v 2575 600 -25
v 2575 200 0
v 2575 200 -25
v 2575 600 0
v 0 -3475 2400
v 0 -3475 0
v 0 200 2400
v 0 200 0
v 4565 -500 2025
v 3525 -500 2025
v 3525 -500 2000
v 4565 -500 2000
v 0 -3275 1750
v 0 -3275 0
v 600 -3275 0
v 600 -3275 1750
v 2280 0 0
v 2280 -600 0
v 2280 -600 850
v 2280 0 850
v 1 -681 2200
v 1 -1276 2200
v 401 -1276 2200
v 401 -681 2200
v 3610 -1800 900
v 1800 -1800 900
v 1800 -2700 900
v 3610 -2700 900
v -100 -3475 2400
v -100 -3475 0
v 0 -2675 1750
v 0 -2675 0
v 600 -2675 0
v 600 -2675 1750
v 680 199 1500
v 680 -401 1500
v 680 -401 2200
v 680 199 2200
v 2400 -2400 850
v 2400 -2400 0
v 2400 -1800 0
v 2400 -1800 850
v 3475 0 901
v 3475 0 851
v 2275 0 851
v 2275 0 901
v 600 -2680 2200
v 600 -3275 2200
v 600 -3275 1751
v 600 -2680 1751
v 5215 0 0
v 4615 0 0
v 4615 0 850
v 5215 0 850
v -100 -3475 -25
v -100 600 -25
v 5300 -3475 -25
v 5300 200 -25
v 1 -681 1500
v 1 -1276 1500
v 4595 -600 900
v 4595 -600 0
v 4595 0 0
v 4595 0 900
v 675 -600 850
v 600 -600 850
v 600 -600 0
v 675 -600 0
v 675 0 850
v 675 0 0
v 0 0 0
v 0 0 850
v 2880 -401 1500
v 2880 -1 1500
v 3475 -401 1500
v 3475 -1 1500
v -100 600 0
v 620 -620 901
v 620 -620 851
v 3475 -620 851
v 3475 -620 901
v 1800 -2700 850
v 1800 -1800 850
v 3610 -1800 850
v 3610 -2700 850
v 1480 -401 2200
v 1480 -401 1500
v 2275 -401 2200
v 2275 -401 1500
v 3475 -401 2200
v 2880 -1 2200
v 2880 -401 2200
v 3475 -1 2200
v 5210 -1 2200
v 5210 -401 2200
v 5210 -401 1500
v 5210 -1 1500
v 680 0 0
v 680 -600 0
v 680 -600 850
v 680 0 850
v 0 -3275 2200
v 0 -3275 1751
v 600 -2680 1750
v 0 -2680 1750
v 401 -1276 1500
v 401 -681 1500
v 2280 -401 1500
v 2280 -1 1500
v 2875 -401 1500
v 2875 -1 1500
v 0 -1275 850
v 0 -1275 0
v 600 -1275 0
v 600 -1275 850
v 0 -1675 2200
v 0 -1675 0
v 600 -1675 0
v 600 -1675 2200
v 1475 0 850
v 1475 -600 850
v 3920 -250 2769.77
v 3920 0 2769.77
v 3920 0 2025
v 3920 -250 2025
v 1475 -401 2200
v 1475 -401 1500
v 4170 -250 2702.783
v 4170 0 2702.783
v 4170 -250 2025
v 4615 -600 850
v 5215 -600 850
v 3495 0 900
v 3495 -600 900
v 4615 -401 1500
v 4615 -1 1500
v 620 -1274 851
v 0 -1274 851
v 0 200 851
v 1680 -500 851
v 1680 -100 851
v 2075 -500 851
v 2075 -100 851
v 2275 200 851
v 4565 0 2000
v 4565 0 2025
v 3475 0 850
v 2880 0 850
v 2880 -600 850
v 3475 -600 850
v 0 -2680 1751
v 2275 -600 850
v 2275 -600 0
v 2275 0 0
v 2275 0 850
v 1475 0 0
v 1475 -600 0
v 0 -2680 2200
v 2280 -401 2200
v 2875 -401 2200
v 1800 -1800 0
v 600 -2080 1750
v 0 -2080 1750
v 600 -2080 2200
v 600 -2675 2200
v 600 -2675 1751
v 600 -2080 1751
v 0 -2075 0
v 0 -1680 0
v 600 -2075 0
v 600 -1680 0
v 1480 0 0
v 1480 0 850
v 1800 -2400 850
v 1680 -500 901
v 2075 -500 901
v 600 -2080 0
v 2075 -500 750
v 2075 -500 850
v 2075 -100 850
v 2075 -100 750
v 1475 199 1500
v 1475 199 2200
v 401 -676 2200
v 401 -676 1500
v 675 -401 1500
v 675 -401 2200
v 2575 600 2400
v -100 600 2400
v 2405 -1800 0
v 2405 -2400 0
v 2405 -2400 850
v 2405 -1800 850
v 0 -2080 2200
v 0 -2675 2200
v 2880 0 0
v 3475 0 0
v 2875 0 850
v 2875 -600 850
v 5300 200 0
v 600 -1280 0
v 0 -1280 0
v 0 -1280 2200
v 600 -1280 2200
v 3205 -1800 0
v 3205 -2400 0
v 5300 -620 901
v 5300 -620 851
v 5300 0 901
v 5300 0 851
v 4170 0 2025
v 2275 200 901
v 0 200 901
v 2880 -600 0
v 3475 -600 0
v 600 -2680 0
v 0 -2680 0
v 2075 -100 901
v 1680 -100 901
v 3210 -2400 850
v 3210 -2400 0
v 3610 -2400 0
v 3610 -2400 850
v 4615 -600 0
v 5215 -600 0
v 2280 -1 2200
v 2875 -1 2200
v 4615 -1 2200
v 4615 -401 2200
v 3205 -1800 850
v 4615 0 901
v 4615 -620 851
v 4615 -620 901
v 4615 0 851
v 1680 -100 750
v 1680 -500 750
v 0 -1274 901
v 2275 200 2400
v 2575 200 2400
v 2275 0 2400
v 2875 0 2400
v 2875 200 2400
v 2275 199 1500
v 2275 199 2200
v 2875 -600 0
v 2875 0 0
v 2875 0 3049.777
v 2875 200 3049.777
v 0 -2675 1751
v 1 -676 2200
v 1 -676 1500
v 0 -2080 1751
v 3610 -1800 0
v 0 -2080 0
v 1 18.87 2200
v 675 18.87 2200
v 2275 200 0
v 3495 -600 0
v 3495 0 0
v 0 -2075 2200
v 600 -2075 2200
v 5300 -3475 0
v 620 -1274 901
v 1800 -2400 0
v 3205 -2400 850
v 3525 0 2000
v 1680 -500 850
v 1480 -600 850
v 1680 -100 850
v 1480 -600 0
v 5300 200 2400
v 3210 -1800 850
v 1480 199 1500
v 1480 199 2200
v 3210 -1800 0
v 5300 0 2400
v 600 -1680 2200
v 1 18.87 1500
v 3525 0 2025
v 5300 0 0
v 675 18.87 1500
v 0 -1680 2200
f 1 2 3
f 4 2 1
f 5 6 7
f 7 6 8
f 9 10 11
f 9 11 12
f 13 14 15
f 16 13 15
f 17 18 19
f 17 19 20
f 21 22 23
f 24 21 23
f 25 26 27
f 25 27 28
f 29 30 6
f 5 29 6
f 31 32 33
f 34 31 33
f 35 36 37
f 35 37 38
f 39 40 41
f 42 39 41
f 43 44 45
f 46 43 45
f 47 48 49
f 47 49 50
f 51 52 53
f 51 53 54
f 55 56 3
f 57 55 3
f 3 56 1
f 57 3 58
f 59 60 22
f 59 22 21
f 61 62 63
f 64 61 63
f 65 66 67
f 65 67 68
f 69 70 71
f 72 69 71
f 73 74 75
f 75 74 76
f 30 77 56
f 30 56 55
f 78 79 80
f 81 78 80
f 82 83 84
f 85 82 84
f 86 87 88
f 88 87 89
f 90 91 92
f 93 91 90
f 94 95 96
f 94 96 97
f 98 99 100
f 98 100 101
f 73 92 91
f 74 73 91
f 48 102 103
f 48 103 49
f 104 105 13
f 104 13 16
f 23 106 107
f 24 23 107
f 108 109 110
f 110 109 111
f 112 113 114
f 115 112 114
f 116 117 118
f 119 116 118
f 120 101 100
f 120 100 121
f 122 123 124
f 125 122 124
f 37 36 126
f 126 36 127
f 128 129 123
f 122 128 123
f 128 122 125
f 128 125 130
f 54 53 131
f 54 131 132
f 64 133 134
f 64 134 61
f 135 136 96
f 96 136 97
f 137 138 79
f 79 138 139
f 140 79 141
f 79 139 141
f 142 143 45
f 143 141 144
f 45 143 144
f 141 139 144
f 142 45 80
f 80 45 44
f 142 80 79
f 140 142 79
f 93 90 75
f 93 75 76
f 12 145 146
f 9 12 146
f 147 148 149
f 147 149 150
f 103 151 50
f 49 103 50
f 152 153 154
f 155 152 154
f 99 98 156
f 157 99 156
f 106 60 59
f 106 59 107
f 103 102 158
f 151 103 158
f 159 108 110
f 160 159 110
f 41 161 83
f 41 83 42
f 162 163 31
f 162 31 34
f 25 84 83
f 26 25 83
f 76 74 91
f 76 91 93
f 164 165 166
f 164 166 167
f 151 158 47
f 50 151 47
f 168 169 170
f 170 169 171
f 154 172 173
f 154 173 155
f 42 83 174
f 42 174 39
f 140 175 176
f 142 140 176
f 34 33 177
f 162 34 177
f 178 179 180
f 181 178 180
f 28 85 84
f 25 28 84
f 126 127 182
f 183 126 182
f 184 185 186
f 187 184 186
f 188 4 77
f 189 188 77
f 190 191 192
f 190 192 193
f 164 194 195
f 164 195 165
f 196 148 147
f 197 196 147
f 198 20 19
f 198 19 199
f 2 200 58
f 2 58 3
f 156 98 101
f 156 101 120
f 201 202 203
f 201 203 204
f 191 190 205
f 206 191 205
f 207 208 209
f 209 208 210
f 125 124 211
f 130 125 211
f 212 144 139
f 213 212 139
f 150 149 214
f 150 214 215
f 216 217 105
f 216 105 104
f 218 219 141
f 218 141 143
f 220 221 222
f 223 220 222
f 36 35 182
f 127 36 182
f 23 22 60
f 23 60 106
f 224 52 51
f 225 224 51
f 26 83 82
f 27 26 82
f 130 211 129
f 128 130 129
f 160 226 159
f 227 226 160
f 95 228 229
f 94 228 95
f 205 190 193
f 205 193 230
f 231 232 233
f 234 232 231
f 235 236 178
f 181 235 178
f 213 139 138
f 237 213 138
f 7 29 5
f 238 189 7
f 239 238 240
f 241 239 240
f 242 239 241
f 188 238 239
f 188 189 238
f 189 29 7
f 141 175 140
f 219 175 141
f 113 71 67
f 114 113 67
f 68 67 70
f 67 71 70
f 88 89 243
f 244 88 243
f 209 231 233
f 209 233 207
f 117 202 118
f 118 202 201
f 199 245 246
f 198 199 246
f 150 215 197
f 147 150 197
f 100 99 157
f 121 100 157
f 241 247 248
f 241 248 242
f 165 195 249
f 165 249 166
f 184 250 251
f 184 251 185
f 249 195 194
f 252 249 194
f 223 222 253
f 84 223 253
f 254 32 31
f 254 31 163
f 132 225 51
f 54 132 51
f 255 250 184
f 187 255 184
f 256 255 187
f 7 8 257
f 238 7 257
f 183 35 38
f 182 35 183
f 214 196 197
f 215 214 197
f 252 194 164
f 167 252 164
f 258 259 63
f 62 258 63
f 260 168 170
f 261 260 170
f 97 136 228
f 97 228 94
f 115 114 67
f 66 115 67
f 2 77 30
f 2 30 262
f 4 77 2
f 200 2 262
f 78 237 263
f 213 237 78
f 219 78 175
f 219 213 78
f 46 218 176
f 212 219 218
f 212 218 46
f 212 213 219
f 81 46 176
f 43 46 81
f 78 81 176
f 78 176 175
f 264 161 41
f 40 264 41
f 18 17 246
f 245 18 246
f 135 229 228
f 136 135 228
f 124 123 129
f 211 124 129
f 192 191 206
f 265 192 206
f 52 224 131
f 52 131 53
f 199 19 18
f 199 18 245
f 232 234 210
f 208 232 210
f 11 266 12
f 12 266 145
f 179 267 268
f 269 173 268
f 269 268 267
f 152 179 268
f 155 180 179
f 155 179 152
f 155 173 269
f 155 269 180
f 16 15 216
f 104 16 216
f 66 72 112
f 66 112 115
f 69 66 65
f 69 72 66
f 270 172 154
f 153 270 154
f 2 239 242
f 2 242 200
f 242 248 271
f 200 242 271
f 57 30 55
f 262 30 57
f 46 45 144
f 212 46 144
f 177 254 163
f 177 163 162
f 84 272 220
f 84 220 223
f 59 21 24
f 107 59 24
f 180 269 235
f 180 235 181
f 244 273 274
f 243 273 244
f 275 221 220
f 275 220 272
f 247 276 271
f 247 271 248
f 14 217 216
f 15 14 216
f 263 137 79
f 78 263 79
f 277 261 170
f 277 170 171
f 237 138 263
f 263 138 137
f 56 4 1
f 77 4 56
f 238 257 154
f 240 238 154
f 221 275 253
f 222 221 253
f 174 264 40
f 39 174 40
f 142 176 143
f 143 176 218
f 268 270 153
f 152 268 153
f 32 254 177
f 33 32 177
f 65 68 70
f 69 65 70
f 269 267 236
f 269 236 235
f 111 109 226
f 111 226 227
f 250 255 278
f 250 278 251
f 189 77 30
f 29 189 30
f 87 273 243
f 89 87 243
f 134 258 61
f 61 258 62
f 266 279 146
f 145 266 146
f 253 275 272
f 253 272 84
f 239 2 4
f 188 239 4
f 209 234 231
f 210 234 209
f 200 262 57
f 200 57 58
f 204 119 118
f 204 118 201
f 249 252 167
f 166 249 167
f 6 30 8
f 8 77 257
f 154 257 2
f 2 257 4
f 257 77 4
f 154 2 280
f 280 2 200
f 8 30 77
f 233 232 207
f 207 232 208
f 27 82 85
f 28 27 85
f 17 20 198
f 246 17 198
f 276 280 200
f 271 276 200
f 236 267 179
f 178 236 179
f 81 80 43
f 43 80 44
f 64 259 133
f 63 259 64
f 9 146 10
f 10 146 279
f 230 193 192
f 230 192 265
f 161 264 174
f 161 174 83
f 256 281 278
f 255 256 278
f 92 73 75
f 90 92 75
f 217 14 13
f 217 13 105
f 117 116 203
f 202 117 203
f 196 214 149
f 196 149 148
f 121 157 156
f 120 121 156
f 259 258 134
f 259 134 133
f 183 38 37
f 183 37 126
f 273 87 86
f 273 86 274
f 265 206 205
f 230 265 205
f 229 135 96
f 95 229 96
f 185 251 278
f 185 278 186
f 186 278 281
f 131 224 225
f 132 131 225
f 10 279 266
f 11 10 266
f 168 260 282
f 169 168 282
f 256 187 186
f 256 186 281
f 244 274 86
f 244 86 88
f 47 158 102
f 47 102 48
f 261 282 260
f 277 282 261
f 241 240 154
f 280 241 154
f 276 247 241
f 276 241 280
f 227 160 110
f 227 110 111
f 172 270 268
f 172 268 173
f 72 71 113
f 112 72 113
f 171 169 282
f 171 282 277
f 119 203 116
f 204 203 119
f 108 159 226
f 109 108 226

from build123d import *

# Parameters (mm, degrees)
F1_DEPTH  = 2400
F3_DEPTH  = 850
F4_W      = 600
F4_H      = 395
F5_DEPTH  = 2200
F6_DEPTH  = 2200
F4_H_2    = 595
F7_DEPTH  = 1750
F8_DEPTH  = 1750
F2_W      = 795
F2_H      = 600
F9_DEPTH  = 850
F10_DEPTH = 850
F2_W_2    = 595
F11_DEPTH = 850
F12_DEPTH = 850
F2_W_3    = 1100
F13_DEPTH = 900
F2_W_4    = 600
F14_DEPTH = 850
F16_W     = 795
F16_H     = 600
F17_DEPTH = 700
F18_DEPTH = 700
F19_DEPTH = 25
F16_W_2   = 595
F16_H_2   = 400
F20_DEPTH = 700
F22_DEPTH = 200
F24_DEPTH = 250
F25_DEPTH = 500
F26_DEPTH = 700
F16_W_3   = 400
F16_H_3   = 595
F27_DEPTH = 700
F31_DEPTH = 50
F30_W     = 685
F30_H     = 620
F28_W     = 395
F28_H     = 400
F32_DEPTH = 100
F33_W     = 600
F33_H     = 595
F34_DEPTH = 449
F35_W     = 600
F35_H     = 600
F36_DEPTH = 850
F35_W_2   = 800
F35_W_3   = 400
F37_W     = 600
F37_H     = 600
F38_DEPTH = 50


# Not quite as in the source:
# - a feature names something its author has since deleted; it is built from what else it names


with BuildPart() as f1:
    # F0 (on Top) → F1 (new body)
    with BuildSketch(Plane.XY):
        Polygon((0, -3475), (0, 200), (2275, 200), (2275, 0), (5300, 0), (5300, 200), (2575, 200), (2575, 600), (-100, 600), (-100, -3475), align=None)
    extrude(amount=F1_DEPTH)

    # F21 (on face) → F22 (join)
    with BuildSketch(Plane.XZ):
        Polygon((2875, 2400), (5300, 2400), (2875, 3049.7767916455), align=None)
    extrude(amount=-F22_DEPTH)


with BuildPart() as f3:
    # F2 (on Top) → F3 (new body)
    with BuildSketch(Plane.XY):
        Polygon((675, 0), (0, 0), (0, -1275), (600, -1275), (600, -600), (675, -600), align=None)
    extrude(amount=F3_DEPTH)


with BuildPart() as f5:
    # F4 (on Top) → F5 (new body)
    with BuildSketch(Plane.XY):
        with Locations((300, -1477.5)):
            Rectangle(F4_W, F4_H)
    extrude(amount=F5_DEPTH)


with BuildPart() as f6:
    # F4 (on Top) → F6 (new body)
    with BuildSketch(Plane.XY):
        with Locations((300, -1877.5)):
            Rectangle(F4_W, F4_H)
    extrude(amount=F6_DEPTH)


with BuildPart() as f7:
    # F4 (on Top) → F7 (new body)
    with BuildSketch(Plane.XY):
        with Locations((300, -2377.5)):
            Rectangle(F4_W, F4_H_2)
    extrude(amount=F7_DEPTH)


with BuildPart() as f8:
    # F4 (on Top) → F8 (new body)
    with BuildSketch(Plane.XY):
        with Locations((300, -2977.5)):
            Rectangle(F4_W, F4_H_2)
    extrude(amount=F8_DEPTH)


with BuildPart() as f9:
    # F2 (on Top) → F9 (new body)
    with BuildSketch(Plane.XY):
        with Locations((1077.5, -300)):
            Rectangle(F2_W, F2_H)
    extrude(amount=F9_DEPTH)


with BuildPart() as f10:
    # F2 (on Top) → F10 (new body)
    with BuildSketch(Plane.XY):
        with Locations((1877.5, -300)):
            Rectangle(F2_W, F2_H)
    extrude(amount=F10_DEPTH)


with BuildPart() as f11:
    # F2 (on Top) → F11 (new body)
    with BuildSketch(Plane.XY):
        with Locations((2577.5, -300)):
            Rectangle(F2_W_2, F2_H)
    extrude(amount=F11_DEPTH)


with BuildPart() as f12:
    # F2 (on Top) → F12 (new body)
    with BuildSketch(Plane.XY):
        with Locations((3177.5, -300)):
            Rectangle(F2_W_2, F2_H)
    extrude(amount=F12_DEPTH)


with BuildPart() as f13:
    # F2 (on Top) → F13 (new body)
    with BuildSketch(Plane.XY):
        with Locations((4045, -300)):
            Rectangle(F2_W_3, F2_H)
    extrude(amount=F13_DEPTH)


with BuildPart() as f14:
    # F2 (on Top) → F14 (new body)
    with BuildSketch(Plane.XY):
        with Locations((4915, -300)):
            Rectangle(F2_W_4, F2_H)
    extrude(amount=F14_DEPTH)


with BuildPart() as f17:
    # F16 (on offset) → F17 (new body)
    with BuildSketch(Plane.XY.offset(1500)):
        with Locations((1077.5, -101)):
            Rectangle(F16_W, F16_H)
    extrude(amount=F17_DEPTH)


with BuildPart() as f18:
    # F16 (on offset) → F18 (new body)
    with BuildSketch(Plane.XY.offset(1500)):
        with Locations((1877.5, -101)):
            Rectangle(F16_W, F16_H)
    extrude(amount=F18_DEPTH)


with BuildPart() as f19:
    # F0 (on Top) → F19 (new body)
    with BuildSketch(Plane.XY):
        Polygon((0, -3475), (0, 200), (2275, 200), (2275, 0), (5300, 0), (5300, 200), (2575, 200), (2575, 600), (-100, 600), (-100, -3475), align=None)
        Polygon((2275, 200), (0, 200), (0, -3475), (5300, -3475), (5300, 0), (2275, 0), align=None)
    extrude(amount=-F19_DEPTH)


with BuildPart() as f20:
    # F16 (on offset) → F20 (new body)
    with BuildSketch(Plane.XY.offset(1500)):
        with Locations((2577.5, -201)):
            Rectangle(F16_W_2, F16_H_2)
    extrude(amount=F20_DEPTH)


with BuildPart() as f20b:
    # F16 (on offset) → F20, piece 2 (new body)
    with BuildSketch(Plane.XY.offset(1500)):
        with Locations((3177.5, -201)):
            Rectangle(F16_W_2, F16_H_2)
    extrude(amount=F20_DEPTH)


with BuildPart() as f20c:
    # F16 (on offset) → F20, piece 3 (new body)
    with BuildSketch(Plane.XY.offset(1500)):
        with Locations((4912.5, -201)):
            Rectangle(F16_W_2, F16_H_2)
    extrude(amount=F20_DEPTH)


with BuildPart() as f24:
    # F23 (on face) → F24 (new body)
    with BuildSketch(Plane.XZ):
        Polygon((3920, 2769.769885555), (3920, 2025), (4170, 2025), (4170, 2702.7825874472), align=None)
    extrude(amount=F24_DEPTH)


with BuildPart() as f25:
    # F23 (on face) → F25 (new body)
    with BuildSketch(Plane.XZ):
        Polygon((3525, 2025), (3525, 2000), (4565, 2000), (4565, 2025), (4170, 2025), (3920, 2025), align=None)
    extrude(amount=F25_DEPTH)


with BuildPart() as f26:
    # F16 (on offset) → F26 (new body)
    with BuildSketch(Plane.XY.offset(1500)):
        Polygon((675, 18.8704896718), (1, 18.8704896718), (1, -676), (401, -676), (675, -401), align=None)
    extrude(amount=F26_DEPTH)


with BuildPart() as f27:
    # F16 (on offset) → F27 (new body)
    with BuildSketch(Plane.XY.offset(1500)):
        with Locations((201, -978.5)):
            Rectangle(F16_W_3, F16_H_3)
    extrude(amount=F27_DEPTH)


with BuildPart() as f31:
    # F30 (on offset) → F31 (new body)
    with BuildSketch(Plane.XY.offset(851)):
        Polygon((2275, 200), (0, 200), (0, -1274), (620, -1274), (620, -620), (3475, -620), (3475, 0), (2275, 0), align=None)
    extrude(amount=F31_DEPTH)


with BuildPart() as f31b:
    # F30 (on offset) → F31, piece 2 (new body)
    with BuildSketch(Plane.XY.offset(851)):
        with Locations((4957.5, -310)):
            Rectangle(F30_W, F30_H)
    extrude(amount=F31_DEPTH)


with BuildPart() as f32_tool:
    # F28 (on face) → F32 (new body, symmetric)
    with BuildSketch(Plane.XY.offset(850)):
        with Locations((1877.5, -300)):
            Rectangle(F28_W, F28_H)
    extrude(amount=F32_DEPTH, both=True)


with BuildPart() as f10_1:
    add(f10.part)

    # F32: cut by f32_tool
    add(f32_tool.part, mode=Mode.SUBTRACT)


with BuildPart() as f31_1:
    add(f31.part)

    # F32: cut by f32_tool
    add(f32_tool.part, mode=Mode.SUBTRACT)


with BuildPart() as f34:
    # F33 (on face) → F34 (new body)
    with BuildSketch(Plane.XY.offset(2200)):
        with Locations((300, -2977.5)):
            Rectangle(F33_W, F33_H)
    extrude(amount=-F34_DEPTH)


with BuildPart() as f34b:
    # F33 (on face) → F34, piece 2 (new body)
    with BuildSketch(Plane.XY.offset(2200)):
        with Locations((300, -2377.5)):
            Rectangle(F33_W, F33_H)
    extrude(amount=-F34_DEPTH)


with BuildPart() as f36:
    # F35 (on face) → F36 (new body)
    with BuildSketch(Plane.XY):
        with Locations((2100, -2100)):
            Rectangle(F35_W, F35_H)
    extrude(amount=F36_DEPTH)


with BuildPart() as f36b:
    # F35 (on face) → F36, piece 2 (new body)
    with BuildSketch(Plane.XY):
        with Locations((2805, -2100)):
            Rectangle(F35_W_2, F35_H)
    extrude(amount=F36_DEPTH)


with BuildPart() as f36c:
    # F35 (on face) → F36, piece 3 (new body)
    with BuildSketch(Plane.XY):
        with Locations((3410, -2100)):
            Rectangle(F35_W_3, F35_H)
    extrude(amount=F36_DEPTH)


with BuildPart() as f38:
    # F37 (on face) → F38 (new body)
    with BuildSketch(Plane.XY.offset(850)):
        Polygon((3610, -1800), (2400, -1800), (2400, -2400), (1800, -2400), (1800, -2700), (3610, -2700), align=None)
        with Locations((2100, -2100)):
            Rectangle(F37_W, F37_H)
    extrude(amount=F38_DEPTH)


solid = Compound([f1.part, f3.part, f5.part, f6.part, f7.part, f8.part, f9.part, f11.part, f12.part, f13.part, f14.part, f17.part, f18.part, f19.part, f20.part, f20b.part, f20c.part, f24.part, f25.part, f26.part, f27.part, f31b.part, f10_1.part, f31_1.part, f34.part, f34b.part, f36.part, f36b.part, f36c.part, f38.part])
